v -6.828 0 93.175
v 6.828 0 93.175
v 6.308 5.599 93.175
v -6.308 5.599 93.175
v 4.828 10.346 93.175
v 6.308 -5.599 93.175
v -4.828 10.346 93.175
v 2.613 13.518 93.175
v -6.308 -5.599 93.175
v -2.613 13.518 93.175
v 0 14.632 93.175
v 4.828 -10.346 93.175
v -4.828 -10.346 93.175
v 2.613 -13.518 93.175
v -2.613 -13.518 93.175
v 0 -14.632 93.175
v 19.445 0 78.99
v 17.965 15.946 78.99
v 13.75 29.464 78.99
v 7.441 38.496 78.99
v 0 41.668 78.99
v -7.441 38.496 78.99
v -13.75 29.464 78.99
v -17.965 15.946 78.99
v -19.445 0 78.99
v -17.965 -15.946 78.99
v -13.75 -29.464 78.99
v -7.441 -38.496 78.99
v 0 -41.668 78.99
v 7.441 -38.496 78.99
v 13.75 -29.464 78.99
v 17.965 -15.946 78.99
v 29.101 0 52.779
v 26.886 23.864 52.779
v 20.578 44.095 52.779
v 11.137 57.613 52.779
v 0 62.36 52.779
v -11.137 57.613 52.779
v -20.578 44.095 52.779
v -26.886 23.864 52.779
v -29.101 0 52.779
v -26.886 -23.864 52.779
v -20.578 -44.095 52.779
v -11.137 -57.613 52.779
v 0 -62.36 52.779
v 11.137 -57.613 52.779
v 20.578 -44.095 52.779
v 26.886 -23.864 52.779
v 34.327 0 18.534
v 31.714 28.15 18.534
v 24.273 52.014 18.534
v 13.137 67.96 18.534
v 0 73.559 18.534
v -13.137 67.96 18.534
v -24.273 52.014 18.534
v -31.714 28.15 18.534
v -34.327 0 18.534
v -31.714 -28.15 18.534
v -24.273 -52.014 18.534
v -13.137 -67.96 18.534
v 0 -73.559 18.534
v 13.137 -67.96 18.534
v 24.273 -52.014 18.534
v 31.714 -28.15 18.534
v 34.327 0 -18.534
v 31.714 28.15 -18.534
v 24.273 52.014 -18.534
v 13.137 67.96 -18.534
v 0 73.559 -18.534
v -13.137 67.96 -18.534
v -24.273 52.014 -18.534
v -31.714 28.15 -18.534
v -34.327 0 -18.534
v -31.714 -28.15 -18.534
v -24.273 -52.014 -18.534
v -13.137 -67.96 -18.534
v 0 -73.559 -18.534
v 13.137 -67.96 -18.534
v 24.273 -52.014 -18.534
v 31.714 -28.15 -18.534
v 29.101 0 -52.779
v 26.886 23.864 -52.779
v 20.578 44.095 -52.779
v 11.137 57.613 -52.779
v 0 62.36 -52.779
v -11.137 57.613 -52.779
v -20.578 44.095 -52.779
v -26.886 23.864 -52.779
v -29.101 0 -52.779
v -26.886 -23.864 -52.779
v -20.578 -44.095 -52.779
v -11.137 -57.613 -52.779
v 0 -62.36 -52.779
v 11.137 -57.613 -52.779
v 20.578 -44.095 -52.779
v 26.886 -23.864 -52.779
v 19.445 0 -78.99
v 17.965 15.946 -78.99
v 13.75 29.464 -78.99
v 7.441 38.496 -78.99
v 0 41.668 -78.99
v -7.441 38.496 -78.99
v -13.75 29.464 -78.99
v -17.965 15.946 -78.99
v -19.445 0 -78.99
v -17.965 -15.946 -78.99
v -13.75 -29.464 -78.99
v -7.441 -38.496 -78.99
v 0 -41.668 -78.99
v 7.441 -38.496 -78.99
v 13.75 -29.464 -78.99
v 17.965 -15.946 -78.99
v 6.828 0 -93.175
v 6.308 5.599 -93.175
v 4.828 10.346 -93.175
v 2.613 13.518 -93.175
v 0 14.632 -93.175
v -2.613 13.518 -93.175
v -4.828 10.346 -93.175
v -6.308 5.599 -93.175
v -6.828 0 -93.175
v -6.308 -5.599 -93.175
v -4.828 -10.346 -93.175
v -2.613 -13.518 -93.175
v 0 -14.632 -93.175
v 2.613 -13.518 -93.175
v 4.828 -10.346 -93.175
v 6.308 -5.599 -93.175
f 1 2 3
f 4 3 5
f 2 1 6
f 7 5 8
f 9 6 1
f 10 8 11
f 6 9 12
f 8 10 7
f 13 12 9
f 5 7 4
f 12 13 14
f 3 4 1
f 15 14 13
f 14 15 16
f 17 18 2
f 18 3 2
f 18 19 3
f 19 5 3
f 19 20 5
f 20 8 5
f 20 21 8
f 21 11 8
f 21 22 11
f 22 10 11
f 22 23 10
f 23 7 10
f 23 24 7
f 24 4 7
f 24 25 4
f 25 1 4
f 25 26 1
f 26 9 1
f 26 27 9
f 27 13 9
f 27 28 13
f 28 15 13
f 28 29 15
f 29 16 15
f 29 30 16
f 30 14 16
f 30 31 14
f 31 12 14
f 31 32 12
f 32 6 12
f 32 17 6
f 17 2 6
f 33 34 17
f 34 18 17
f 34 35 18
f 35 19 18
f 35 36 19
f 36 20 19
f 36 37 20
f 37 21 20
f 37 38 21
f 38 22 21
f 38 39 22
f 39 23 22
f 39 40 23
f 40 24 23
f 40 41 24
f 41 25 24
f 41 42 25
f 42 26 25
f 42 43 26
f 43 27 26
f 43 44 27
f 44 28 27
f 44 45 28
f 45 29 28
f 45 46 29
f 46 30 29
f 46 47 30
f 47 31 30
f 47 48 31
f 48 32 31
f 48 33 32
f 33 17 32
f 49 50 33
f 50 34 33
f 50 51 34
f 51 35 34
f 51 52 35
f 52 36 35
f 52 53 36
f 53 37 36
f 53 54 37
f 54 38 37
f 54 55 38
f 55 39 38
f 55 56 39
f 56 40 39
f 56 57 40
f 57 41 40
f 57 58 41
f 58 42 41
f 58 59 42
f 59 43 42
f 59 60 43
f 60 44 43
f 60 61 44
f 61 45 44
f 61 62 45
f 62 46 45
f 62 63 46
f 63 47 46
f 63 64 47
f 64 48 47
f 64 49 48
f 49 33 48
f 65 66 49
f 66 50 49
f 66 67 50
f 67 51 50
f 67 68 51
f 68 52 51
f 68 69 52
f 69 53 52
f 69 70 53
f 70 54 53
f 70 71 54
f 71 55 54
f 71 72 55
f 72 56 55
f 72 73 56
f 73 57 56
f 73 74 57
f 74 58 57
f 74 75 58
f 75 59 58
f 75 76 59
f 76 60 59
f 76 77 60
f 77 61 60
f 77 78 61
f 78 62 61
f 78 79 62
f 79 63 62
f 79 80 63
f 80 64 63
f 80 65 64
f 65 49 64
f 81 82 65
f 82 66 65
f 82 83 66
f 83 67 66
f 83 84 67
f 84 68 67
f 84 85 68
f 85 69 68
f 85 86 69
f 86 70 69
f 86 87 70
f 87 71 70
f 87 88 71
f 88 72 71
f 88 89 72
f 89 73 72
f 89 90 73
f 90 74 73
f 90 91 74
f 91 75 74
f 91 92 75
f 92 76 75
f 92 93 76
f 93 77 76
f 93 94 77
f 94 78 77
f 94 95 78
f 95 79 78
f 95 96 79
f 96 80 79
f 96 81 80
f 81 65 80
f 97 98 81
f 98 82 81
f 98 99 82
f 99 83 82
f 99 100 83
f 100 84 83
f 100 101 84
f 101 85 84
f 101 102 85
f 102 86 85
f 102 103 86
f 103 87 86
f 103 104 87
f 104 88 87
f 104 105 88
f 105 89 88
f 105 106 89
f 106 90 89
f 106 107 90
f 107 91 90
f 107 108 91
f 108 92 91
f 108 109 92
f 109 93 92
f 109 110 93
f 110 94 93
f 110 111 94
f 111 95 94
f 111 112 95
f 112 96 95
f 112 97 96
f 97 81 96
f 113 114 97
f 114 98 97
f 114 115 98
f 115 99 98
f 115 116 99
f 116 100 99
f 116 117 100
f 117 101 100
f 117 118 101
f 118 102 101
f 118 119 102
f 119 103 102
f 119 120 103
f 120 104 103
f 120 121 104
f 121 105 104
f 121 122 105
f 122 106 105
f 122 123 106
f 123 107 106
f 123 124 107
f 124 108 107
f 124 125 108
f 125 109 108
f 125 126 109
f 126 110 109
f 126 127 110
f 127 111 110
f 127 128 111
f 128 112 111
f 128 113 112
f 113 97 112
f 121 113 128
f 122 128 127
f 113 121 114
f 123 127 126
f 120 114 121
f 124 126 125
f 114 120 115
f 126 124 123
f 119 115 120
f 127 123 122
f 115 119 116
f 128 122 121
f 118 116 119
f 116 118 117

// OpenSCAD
// Generated by SolidPython 1.0.1 on 2020-07-29 00:46:48


scale(v = [7, 15, 19]) {
	sphere(r = 5);
}
/***********************************************
*********      SolidPython code:      **********
************************************************
 
# import packages: SolidPython
from solid import *
from solid.utils import *
from itertools import chain, combinations, permutations


class Resize:

    def __init__(self, scad_file):
        self.scad_file = scad_file
        #self.scad_file = import_scad(scad_file)
        # cone/cylinder param:
        self.r1 = 0
        self.r2 = 0
        self.h = 0
        # rectangular prism param:
        self.w = 0
        self.l = 0
        # ellipse param:
        self.r = 0

    # import OpenScad code (file name corresponds to shape)


    # classify shape + parameters
    def assign(self, param1, param2, param3):
        if self.scad_file == 'cone.scad':
            self.r1 = param1
            self.r2 = param2
            self.h = param3
        elif self.scad_file == 'cylinder.scad':
            self.r1 = param1
            self.r2 = param2
            self.h = param3
        elif self.scad_file == 'rectangularPrism.scad':
            self.h = param1
            self.l = param2
            self.w = param3
        else:
            self.r = param1
            self.h = param2

    # resize parameters
    def iterate(self):
        x = range(3, 20, 2)
        i = 1
        if self.scad_file == 'cone.scad':
            tempList = list(permutations(x, 2))
            for temp in tempList:
                param1 = temp[0]
                param2 = temp[1]
                filepath = 'produced_scad_files/' + 'cone' + str(param1) + '_' + str(param2) + '_' + '.scad'
                scad_render_to_file(cylinder(h=param1, r1=param2, r2=0), filepath)

        elif self.scad_file == 'cylinder.scad':
            tempList = list(permutations(x, 3))
            for temp in tempList:
                param1 = temp[0]
                param2 = temp[1]
                filepath = 'produced_scad_files/' + 'cylinder' + str(param1) + '_' + str(param2) + '_' + '.scad'
                scad_render_to_file(cylinder(h=param1, r1=param2, r2=param2), filepath)

        elif self.scad_file == 'rectangularPrism.scad':
            tempList = list(permutations(x, 3))
            for temp in tempList:
                param1 = temp[0]
                param2 = temp[1]
                param3 = temp[2]
                filepath = 'produced_scad_files/' + 'rectangularPrism' + str(param1) + '_' + str(param2) + '_' + str(
                    param3) + '.scad'
                scad_render_to_file(cube(size=(param1, param2, param3)), filepath)

        elif self.scad_file == 'ellipse.scad':
            tempList = list(permutations(x, 4))
            for temp in tempList:
                param1 = temp[0]
                param2 = temp[1]
                param3 = temp[2]
                param4 = temp[3]
                filepath = 'produced_scad_files/' + 'ellipse' + str(param1) + '_' + str(param2) + '_' + str(param3) + '_' + str(param4) + '.scad'
                scad_render_to_file(scale([param1, param2, param3])(sphere(r=param4)), filepath)

    def render_to_scadfile(self):
        scad_render_to_file(scad, 'example.scad') 
 
************************************************/
